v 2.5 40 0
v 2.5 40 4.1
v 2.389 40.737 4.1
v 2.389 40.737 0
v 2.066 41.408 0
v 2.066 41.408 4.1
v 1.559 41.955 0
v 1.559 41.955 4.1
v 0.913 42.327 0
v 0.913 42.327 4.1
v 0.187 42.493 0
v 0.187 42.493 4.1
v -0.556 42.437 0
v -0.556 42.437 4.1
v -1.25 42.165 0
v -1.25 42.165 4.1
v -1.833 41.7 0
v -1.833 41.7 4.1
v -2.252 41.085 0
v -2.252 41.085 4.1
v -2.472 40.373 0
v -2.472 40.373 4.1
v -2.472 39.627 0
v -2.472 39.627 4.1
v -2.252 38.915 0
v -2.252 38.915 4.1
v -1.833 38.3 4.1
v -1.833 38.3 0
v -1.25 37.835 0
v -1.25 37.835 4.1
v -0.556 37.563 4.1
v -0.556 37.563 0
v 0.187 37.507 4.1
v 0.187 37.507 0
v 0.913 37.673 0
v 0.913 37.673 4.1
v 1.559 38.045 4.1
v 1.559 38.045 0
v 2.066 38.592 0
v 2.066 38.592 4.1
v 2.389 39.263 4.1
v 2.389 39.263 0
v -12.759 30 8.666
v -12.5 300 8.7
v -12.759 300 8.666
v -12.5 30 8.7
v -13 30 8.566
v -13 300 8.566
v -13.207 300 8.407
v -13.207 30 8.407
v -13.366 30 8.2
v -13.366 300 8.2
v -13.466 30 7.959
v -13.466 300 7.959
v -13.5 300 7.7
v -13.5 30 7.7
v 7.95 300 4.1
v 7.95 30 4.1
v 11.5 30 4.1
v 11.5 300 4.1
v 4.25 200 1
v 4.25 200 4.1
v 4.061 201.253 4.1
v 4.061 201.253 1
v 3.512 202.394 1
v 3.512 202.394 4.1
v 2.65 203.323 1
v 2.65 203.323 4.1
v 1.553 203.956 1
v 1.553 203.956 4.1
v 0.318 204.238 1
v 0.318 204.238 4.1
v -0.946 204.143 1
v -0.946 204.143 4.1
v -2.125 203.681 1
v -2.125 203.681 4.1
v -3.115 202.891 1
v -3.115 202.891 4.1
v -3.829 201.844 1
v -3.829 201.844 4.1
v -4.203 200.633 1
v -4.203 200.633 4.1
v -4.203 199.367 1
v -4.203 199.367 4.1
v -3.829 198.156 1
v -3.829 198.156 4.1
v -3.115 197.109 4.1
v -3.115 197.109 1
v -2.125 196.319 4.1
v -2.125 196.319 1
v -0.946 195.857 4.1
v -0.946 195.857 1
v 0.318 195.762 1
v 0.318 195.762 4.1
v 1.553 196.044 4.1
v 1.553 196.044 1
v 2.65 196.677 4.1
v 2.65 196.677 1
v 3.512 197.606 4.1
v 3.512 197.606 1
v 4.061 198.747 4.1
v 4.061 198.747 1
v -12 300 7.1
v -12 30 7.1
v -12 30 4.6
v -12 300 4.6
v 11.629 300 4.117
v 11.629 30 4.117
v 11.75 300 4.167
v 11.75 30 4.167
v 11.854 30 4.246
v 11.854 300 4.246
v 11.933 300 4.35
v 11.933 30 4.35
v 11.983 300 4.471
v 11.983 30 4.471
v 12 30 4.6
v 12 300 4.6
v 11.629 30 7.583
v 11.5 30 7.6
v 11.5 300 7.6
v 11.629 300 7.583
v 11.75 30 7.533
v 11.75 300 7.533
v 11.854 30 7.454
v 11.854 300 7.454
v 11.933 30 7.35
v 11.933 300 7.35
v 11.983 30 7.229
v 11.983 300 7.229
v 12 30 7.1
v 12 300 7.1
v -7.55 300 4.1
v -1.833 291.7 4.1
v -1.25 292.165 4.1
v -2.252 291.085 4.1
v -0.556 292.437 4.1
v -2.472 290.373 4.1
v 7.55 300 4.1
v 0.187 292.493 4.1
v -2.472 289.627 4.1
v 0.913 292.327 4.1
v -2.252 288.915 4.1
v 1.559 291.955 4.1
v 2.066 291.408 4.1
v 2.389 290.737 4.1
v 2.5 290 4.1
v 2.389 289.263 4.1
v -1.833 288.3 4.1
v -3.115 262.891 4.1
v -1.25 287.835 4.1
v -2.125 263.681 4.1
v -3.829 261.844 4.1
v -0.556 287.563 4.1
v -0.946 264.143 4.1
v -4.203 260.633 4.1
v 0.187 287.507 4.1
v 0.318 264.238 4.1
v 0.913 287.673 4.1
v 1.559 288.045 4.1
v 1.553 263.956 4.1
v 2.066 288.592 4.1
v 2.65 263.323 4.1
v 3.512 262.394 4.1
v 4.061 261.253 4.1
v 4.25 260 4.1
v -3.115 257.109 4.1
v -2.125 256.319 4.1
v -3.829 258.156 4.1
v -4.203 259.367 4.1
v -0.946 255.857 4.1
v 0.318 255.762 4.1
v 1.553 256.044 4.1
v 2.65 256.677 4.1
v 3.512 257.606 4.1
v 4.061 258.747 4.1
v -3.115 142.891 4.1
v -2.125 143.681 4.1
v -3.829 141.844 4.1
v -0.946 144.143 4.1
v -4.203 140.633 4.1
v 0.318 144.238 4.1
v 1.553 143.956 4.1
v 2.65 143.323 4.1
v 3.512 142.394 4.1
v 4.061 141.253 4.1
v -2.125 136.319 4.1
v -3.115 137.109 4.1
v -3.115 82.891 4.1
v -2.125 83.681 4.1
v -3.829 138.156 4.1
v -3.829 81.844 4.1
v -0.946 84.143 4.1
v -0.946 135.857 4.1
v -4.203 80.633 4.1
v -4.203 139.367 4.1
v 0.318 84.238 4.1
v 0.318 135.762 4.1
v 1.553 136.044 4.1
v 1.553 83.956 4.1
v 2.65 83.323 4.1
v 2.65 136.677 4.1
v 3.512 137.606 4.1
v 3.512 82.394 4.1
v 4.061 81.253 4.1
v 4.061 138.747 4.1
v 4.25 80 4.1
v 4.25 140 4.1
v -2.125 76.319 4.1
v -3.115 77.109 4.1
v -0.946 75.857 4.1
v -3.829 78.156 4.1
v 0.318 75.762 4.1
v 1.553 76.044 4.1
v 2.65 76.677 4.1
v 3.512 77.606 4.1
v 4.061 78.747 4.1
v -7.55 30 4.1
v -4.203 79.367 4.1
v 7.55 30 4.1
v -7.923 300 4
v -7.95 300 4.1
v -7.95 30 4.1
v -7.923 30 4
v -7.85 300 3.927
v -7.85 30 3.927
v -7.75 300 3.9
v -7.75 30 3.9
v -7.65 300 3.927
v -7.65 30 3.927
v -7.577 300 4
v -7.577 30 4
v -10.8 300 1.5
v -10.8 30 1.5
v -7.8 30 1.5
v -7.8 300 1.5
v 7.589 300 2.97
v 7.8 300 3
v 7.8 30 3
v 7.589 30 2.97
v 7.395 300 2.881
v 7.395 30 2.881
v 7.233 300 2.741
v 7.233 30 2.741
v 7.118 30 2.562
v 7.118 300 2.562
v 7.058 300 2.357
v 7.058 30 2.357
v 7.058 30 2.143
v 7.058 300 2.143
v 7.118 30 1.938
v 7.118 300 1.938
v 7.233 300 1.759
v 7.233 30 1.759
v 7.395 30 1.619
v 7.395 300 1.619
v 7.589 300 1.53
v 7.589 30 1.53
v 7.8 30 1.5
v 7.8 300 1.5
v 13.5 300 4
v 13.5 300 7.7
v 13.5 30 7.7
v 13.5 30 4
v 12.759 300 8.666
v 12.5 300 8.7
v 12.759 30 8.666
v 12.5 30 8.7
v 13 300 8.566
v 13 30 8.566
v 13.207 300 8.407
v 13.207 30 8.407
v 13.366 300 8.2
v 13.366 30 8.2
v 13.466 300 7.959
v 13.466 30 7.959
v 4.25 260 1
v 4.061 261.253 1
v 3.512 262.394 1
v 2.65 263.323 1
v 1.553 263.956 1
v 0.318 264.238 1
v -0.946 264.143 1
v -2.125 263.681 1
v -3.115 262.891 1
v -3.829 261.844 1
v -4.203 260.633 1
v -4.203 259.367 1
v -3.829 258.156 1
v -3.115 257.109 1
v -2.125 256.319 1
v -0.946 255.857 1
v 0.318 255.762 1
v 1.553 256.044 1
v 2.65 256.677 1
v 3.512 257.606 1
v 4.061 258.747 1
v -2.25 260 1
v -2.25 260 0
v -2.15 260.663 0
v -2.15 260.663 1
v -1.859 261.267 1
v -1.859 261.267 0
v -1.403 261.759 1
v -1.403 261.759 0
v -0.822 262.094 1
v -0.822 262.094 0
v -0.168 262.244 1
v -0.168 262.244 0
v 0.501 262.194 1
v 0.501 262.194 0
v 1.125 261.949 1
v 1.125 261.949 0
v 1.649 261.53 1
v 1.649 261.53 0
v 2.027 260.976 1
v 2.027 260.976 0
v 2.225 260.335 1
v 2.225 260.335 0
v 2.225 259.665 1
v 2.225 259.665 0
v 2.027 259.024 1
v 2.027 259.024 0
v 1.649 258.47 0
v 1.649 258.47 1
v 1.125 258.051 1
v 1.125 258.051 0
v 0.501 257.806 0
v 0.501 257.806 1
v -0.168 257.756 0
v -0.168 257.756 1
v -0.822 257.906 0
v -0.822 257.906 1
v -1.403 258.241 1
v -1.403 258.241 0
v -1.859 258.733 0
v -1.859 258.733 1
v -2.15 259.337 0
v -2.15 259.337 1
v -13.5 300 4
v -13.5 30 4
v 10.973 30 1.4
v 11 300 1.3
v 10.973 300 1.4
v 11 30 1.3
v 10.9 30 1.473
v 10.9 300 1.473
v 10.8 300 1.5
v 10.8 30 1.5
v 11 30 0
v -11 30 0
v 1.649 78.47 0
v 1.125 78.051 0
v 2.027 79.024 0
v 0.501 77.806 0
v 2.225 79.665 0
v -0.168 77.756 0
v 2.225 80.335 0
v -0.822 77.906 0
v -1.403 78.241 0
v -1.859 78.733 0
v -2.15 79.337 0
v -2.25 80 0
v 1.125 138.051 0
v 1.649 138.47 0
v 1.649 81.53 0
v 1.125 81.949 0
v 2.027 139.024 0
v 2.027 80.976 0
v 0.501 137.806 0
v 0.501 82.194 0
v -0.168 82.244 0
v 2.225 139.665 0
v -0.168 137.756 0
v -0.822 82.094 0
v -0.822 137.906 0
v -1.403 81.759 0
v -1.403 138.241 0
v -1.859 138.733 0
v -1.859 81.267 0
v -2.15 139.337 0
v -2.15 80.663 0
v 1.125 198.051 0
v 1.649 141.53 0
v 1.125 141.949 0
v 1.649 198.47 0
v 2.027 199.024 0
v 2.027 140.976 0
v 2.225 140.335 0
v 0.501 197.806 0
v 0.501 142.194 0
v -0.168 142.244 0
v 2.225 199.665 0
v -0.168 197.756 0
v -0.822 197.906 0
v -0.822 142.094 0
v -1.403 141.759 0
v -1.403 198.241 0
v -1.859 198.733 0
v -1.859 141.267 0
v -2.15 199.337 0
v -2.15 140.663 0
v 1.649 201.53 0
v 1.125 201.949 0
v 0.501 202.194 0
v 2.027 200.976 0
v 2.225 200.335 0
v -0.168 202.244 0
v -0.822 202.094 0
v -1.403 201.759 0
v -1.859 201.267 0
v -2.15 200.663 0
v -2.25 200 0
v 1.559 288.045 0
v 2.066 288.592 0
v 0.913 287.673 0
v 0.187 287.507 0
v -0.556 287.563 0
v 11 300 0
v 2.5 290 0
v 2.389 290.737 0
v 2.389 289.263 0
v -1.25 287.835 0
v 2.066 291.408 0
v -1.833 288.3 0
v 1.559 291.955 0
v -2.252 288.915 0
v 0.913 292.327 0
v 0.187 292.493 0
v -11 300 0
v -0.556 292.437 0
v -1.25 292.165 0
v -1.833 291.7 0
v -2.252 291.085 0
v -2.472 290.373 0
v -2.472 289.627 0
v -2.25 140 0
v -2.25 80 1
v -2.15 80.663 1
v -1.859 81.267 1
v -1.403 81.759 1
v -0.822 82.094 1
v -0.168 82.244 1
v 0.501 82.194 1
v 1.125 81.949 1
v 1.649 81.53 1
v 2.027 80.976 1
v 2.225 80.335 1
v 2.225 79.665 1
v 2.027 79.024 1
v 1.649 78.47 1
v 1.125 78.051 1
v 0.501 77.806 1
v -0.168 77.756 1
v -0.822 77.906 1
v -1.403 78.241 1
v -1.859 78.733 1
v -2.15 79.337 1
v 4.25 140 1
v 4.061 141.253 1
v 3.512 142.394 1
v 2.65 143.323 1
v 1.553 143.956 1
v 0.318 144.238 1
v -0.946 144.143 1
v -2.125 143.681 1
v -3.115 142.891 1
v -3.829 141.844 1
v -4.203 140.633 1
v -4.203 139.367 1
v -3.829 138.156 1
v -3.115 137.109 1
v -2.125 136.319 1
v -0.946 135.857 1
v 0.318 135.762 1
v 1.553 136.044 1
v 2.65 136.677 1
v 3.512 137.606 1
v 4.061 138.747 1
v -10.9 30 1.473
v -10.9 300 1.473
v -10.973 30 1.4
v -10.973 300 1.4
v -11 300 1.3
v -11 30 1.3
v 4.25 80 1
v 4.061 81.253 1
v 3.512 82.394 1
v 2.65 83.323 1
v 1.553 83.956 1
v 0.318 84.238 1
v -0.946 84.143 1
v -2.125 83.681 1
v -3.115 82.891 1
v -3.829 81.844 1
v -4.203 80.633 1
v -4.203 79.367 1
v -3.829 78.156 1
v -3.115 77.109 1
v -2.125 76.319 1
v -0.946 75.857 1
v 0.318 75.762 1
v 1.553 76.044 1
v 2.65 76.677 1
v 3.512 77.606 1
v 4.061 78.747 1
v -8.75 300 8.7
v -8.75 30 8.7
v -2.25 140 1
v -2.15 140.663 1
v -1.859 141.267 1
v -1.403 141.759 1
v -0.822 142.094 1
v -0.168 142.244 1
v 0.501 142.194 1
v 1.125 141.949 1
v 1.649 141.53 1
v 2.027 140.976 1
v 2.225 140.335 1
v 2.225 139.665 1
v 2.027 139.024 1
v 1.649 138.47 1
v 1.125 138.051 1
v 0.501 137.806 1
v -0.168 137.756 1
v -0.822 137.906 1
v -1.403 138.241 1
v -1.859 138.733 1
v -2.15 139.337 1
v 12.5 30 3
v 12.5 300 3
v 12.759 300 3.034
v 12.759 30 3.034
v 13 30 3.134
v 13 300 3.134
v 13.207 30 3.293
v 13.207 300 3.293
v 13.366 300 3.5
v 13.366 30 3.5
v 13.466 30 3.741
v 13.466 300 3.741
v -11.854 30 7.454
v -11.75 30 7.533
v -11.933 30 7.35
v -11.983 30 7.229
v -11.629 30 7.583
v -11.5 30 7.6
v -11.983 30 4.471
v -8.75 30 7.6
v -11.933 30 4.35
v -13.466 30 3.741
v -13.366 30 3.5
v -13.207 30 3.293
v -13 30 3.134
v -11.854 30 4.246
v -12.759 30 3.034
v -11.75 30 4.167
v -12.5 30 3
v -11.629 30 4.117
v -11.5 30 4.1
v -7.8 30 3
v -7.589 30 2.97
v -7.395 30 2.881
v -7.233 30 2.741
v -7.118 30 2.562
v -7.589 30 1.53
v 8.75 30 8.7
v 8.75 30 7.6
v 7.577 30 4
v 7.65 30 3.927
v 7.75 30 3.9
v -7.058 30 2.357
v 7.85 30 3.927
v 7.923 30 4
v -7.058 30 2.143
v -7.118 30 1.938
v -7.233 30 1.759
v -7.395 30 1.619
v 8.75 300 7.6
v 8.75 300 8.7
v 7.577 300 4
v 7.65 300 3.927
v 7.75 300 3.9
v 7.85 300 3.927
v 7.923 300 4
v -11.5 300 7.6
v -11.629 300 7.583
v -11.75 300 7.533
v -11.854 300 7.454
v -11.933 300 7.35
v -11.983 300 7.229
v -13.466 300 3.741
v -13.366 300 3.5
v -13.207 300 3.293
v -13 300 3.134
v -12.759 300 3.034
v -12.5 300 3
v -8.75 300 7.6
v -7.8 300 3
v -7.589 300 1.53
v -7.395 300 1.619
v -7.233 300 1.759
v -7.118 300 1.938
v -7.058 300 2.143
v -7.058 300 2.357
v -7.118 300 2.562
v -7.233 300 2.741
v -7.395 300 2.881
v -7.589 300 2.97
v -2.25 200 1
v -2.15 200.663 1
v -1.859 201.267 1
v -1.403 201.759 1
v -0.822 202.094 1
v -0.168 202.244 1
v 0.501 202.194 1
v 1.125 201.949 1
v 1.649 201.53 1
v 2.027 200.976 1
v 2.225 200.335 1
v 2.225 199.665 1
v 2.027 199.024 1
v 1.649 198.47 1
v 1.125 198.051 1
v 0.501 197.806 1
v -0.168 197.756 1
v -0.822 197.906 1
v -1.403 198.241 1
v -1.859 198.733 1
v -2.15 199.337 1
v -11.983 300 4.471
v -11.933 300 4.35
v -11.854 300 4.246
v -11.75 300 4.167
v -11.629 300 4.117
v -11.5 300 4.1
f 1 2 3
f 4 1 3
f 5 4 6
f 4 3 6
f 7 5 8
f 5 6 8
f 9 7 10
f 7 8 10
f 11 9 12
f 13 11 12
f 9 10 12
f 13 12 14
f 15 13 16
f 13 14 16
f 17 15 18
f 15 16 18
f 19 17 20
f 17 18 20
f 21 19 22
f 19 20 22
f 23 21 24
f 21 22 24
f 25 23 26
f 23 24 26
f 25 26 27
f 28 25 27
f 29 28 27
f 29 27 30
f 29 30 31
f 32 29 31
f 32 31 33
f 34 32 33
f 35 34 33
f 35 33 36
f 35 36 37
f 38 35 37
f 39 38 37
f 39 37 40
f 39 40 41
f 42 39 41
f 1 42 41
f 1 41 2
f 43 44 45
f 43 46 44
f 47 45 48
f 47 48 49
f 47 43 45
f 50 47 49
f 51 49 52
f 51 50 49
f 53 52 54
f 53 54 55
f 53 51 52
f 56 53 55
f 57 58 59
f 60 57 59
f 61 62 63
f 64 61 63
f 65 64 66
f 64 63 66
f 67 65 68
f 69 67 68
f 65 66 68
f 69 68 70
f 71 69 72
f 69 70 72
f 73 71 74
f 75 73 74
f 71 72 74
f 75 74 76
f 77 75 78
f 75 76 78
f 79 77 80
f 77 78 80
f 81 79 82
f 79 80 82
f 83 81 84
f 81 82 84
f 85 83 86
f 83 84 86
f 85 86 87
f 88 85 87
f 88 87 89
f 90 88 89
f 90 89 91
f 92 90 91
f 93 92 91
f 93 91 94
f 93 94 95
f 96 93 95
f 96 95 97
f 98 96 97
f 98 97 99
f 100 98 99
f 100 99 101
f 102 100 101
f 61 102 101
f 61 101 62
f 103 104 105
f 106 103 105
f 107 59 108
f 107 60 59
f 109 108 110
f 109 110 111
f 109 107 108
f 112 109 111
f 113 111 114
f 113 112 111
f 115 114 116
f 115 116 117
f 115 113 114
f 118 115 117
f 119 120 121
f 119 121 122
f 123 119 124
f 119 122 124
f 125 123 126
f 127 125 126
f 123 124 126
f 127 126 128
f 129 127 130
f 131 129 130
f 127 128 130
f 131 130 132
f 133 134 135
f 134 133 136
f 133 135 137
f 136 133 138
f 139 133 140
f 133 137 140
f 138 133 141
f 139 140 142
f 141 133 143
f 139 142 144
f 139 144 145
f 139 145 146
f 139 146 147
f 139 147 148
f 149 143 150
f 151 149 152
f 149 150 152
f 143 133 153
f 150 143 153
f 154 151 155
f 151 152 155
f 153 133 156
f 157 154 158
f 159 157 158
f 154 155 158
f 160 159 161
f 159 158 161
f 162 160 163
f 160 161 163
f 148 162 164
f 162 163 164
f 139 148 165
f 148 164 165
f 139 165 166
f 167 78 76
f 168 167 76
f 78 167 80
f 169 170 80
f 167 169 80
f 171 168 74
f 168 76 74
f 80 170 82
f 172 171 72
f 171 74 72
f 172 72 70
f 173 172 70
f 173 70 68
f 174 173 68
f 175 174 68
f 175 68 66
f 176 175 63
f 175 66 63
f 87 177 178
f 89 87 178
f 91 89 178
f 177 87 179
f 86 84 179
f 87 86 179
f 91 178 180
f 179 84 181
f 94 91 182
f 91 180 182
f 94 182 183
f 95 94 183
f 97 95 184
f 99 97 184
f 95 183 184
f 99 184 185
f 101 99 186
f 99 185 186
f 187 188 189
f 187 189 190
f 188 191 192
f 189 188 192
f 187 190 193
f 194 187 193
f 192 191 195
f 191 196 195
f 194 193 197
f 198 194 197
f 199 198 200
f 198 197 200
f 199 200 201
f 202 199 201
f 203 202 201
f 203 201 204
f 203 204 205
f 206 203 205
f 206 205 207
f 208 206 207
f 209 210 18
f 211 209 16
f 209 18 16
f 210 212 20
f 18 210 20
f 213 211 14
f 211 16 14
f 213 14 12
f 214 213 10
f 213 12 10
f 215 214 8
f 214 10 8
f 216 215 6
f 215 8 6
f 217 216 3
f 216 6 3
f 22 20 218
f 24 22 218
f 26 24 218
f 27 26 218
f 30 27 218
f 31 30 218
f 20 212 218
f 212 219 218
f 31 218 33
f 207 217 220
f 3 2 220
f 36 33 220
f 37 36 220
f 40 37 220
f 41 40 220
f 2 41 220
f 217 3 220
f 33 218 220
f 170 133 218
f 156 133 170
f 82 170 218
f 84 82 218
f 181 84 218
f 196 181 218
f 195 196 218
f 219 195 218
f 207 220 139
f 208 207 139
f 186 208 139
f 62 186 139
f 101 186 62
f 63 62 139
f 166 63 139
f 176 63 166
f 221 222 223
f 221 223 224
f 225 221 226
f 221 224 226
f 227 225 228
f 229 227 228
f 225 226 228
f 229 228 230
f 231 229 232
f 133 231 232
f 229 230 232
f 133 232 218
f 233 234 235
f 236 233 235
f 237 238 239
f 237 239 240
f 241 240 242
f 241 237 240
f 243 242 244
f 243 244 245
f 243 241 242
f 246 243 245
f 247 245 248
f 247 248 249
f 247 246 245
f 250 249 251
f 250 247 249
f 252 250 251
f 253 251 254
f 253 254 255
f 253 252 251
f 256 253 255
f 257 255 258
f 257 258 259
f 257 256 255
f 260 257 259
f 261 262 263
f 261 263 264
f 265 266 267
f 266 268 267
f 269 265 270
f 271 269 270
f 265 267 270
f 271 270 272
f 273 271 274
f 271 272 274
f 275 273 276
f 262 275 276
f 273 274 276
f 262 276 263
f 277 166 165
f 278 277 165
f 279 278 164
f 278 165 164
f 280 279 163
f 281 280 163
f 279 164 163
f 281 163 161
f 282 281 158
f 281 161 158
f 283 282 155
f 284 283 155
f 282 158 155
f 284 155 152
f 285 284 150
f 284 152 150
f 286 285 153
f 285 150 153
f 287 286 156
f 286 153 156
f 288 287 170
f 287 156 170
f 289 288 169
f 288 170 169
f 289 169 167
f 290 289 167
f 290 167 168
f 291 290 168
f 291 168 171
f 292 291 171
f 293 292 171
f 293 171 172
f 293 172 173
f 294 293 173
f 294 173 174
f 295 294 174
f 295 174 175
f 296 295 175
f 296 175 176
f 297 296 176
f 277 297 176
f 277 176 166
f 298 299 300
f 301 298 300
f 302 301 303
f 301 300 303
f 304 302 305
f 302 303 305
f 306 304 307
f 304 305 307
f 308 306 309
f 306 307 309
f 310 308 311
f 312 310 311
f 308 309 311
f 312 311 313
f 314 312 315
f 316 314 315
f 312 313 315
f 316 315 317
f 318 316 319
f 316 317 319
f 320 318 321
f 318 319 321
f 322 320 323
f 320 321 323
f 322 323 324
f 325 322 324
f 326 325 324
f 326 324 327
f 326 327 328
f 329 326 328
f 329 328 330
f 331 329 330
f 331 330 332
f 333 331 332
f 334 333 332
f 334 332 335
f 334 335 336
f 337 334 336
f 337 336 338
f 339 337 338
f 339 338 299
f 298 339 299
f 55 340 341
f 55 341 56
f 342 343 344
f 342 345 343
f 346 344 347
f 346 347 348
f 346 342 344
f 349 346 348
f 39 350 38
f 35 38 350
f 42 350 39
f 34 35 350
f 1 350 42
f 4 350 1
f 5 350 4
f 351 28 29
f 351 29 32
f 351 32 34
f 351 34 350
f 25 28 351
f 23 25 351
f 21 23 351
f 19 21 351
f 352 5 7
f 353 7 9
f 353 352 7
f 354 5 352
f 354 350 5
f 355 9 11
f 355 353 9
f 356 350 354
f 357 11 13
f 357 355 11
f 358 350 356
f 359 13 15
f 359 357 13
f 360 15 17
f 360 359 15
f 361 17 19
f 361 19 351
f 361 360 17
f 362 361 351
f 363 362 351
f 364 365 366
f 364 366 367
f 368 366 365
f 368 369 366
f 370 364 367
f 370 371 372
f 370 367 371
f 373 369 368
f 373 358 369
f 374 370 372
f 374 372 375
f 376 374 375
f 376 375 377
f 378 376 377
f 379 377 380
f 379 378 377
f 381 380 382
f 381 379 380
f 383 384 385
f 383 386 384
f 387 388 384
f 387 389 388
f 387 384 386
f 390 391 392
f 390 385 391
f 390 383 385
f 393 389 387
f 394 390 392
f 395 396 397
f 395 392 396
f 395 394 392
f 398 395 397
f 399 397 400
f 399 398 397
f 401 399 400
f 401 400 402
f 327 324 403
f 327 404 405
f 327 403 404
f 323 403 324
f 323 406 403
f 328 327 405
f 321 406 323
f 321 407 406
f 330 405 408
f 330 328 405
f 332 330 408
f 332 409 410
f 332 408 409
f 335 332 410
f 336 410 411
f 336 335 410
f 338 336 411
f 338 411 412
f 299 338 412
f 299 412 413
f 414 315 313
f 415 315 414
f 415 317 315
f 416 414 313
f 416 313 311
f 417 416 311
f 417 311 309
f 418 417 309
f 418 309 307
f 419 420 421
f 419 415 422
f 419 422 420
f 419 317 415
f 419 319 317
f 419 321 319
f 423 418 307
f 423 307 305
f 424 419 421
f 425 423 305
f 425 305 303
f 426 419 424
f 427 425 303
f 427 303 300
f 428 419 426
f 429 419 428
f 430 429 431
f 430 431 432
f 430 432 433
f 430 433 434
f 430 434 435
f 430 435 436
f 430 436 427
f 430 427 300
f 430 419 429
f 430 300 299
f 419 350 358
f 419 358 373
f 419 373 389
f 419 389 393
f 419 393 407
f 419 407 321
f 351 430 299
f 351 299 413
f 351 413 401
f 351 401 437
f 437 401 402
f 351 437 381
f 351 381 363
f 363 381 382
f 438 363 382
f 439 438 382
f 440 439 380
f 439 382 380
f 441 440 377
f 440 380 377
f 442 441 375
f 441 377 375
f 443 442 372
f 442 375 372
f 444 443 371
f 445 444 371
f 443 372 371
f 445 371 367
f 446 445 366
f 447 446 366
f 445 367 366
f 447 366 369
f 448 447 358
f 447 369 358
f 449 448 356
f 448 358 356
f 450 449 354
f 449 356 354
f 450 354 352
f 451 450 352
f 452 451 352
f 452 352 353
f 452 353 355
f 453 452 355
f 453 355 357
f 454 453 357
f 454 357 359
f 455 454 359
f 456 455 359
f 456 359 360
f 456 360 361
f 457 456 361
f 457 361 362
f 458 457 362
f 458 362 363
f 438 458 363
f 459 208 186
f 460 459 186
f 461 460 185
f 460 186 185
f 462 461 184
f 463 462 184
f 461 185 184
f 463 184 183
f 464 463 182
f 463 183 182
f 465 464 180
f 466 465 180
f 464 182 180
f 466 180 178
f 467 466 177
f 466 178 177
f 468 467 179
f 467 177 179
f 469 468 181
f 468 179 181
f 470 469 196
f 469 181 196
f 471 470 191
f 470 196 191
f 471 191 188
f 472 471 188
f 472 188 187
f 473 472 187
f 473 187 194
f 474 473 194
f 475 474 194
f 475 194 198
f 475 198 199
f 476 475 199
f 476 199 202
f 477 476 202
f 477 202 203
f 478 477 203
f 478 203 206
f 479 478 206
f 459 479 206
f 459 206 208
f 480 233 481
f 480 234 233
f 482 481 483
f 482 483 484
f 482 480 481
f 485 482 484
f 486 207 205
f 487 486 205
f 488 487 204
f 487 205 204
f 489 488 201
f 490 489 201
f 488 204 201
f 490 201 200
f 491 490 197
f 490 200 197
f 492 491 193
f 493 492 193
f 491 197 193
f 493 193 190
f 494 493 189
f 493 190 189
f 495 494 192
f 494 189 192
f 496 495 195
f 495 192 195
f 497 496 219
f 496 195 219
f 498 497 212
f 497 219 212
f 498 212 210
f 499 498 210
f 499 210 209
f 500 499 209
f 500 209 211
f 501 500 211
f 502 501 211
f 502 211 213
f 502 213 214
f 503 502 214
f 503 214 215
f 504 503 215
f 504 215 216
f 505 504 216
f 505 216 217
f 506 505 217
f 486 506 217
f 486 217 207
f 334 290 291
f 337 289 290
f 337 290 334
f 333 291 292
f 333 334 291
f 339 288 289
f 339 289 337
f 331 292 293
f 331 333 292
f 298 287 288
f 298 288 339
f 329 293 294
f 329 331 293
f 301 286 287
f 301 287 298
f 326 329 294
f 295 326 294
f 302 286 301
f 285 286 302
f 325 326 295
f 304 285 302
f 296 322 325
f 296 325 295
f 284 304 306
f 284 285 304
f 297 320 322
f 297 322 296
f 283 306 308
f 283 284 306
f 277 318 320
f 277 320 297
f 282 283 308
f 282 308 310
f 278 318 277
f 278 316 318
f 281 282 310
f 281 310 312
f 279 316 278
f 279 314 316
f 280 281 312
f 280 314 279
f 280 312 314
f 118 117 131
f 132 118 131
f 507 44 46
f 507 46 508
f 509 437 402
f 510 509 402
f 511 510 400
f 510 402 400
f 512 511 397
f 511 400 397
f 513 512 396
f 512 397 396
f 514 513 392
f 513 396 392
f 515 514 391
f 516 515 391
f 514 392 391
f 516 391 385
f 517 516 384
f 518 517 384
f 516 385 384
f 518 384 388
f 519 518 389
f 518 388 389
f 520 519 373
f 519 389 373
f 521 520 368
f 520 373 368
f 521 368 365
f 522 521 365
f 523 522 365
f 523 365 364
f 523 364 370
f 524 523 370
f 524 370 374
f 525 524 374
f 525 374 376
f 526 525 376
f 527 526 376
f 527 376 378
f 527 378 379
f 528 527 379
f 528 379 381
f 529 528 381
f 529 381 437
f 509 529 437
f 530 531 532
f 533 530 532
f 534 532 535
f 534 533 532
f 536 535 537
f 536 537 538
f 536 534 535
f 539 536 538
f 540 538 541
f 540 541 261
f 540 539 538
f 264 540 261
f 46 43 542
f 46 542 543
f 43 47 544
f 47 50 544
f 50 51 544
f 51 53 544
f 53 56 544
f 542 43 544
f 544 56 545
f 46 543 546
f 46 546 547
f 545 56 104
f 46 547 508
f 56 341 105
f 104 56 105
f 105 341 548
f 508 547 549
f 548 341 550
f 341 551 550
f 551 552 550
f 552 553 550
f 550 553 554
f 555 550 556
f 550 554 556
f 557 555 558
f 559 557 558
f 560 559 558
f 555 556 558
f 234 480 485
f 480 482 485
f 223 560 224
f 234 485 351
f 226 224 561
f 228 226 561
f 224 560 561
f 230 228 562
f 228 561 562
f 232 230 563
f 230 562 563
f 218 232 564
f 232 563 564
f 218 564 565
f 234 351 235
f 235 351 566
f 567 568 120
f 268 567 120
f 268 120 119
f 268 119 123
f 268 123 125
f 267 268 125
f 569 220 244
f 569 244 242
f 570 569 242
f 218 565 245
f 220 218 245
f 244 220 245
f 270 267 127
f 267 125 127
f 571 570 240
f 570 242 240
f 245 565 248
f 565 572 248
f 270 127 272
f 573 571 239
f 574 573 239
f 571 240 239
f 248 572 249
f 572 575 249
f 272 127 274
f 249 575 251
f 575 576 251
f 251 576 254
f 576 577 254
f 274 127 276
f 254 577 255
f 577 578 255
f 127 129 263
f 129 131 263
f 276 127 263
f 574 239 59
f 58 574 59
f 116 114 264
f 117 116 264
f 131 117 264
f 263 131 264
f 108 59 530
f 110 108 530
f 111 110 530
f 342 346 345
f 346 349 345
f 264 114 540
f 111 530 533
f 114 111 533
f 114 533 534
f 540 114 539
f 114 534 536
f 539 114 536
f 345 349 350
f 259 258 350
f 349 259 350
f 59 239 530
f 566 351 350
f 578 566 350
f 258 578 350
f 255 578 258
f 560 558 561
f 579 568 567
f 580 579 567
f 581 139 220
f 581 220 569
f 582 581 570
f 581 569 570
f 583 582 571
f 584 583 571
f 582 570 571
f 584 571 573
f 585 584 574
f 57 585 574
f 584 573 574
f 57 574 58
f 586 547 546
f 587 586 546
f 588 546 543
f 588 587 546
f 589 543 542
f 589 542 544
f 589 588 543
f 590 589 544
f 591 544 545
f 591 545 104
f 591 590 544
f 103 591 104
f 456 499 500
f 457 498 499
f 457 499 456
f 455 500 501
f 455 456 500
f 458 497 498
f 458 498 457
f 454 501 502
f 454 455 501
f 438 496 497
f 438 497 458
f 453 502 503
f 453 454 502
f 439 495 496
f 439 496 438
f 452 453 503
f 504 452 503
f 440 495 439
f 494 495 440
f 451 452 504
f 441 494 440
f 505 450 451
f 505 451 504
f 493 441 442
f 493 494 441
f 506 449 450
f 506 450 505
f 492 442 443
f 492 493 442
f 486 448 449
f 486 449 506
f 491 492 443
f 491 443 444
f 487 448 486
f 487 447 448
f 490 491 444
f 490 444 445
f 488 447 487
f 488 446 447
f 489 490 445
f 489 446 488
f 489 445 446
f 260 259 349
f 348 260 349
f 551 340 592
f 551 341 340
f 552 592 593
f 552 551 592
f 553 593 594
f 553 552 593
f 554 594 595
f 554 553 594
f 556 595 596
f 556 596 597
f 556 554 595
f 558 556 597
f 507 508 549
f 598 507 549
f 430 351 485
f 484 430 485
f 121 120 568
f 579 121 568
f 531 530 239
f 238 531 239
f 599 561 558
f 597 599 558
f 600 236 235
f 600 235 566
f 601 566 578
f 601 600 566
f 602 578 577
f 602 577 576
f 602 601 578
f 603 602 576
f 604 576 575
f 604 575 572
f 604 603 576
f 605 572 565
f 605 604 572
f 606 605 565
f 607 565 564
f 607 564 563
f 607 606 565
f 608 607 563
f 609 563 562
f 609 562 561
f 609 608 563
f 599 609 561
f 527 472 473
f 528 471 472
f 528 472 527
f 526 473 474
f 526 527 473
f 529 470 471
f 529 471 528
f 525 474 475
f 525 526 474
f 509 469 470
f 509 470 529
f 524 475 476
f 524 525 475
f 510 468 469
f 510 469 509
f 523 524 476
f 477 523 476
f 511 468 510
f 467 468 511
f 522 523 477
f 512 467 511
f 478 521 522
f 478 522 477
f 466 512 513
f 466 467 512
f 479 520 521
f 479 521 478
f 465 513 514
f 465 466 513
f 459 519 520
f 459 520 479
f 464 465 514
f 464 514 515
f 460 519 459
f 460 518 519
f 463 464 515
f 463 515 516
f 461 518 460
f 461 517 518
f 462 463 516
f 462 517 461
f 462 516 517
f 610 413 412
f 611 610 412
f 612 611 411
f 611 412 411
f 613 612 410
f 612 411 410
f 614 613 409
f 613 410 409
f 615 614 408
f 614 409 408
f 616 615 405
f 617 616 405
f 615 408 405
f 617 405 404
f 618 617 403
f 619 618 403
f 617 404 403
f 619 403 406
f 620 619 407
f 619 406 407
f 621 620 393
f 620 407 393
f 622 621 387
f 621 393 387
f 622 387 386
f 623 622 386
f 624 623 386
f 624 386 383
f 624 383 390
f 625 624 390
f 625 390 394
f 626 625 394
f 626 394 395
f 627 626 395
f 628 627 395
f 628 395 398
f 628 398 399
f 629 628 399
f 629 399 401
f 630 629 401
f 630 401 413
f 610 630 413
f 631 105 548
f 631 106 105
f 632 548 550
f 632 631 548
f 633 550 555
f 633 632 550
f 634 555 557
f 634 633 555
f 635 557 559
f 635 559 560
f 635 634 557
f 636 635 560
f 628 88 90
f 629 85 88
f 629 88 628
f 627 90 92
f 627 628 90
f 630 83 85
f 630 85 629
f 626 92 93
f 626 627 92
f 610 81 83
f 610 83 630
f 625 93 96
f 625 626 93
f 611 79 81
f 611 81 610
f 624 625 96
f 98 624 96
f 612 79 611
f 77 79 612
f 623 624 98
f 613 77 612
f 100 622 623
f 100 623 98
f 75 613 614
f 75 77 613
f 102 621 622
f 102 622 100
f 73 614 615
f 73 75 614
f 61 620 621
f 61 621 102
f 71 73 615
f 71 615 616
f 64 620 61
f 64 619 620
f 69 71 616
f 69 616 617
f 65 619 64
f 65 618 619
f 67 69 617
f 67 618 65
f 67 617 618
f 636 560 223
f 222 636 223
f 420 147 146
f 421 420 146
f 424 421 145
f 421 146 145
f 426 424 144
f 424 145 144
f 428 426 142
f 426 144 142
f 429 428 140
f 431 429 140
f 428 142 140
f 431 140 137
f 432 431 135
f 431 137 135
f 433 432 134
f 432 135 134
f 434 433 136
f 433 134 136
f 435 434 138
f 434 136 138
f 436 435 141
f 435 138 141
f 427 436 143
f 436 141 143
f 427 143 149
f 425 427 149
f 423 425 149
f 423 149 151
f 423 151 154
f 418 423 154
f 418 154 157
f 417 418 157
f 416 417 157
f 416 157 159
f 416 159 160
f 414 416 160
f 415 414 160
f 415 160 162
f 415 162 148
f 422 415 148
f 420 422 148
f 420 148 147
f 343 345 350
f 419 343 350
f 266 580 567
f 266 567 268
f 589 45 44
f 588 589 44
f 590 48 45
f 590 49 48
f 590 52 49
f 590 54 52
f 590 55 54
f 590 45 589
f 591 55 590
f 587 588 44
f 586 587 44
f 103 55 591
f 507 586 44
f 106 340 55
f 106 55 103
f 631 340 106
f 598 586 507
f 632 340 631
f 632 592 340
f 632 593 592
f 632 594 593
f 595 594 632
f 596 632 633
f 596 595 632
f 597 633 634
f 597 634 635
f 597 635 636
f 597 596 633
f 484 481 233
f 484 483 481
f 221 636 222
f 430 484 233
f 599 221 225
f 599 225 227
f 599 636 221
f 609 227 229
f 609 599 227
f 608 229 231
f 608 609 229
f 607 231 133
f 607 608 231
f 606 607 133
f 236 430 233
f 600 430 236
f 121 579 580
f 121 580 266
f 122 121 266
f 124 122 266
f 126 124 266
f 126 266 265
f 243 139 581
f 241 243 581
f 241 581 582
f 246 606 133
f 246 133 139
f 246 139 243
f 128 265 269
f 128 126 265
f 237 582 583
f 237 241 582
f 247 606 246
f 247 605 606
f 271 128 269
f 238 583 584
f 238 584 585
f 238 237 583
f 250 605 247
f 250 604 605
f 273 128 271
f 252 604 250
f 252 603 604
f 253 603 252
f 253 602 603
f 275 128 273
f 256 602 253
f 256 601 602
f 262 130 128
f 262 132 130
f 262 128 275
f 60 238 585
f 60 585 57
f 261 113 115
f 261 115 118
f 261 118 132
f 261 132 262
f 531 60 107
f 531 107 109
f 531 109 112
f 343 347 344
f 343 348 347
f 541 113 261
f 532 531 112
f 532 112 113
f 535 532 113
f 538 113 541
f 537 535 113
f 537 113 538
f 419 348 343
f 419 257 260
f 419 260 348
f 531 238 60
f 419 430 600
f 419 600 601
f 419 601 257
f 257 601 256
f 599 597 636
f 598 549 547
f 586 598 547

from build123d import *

# Parameters (mm, degrees)
BOSS_EXTRUDE1_DEPTH                              = 270
CUT_EXTRUDE1_DEPTH                               = 271.477244884
F_0_4_0_4_DIAMETER_HOLE1_D                       = 0.4
CBORE_FOR_M4_HEX_HEAD_MACHINE_SCREW1_D           = 4.5
CBORE_FOR_M4_HEX_HEAD_MACHINE_SCREW1_DEPTH       = 4.1
CBORE_FOR_M4_HEX_HEAD_MACHINE_SCREW1_CBORE_D     = 8.5
CBORE_FOR_M4_HEX_HEAD_MACHINE_SCREW1_CBORE_DEPTH = 3.1
FILLET1_R                                        = 0.2
FILLET2_R                                        = 0.5
FILLET3_R                                        = 1
CUT_EXTRUDE2_REACH                               = 302.339
SKETCH7_R                                        = 2.5


with BuildPart() as part:
    # Sketch1 → Boss-Extrude1 (new body)
    with BuildSketch(Plane(origin=(0, 300, 0), x_dir=(1, 0, 0), z_dir=(0, 1, 0))):
        with BuildLine():
            Line((-13.5, -3), (-13.5, -8.7))
            Line((-13.5, -8.7), (13.5, -8.7))
            Line((13.5, -8.7), (13.5, -3))
            Line((13.5, -3), (7.8, -3))
            ThreePointArc((7.8, -3), (7.05, -2.25), (7.8, -1.5))
            Line((7.8, -1.5), (11, -1.5))
            Line((11, -1.5), (11, 0))
            Line((11, 0), (-11, 0))
            Line((-11, 0), (-11, -1.5))
            Line((-11, -1.5), (-7.8, -1.5))
            ThreePointArc((-7.8, -1.5), (-7.05, -2.25), (-7.8, -3))
            Line((-7.8, -3), (-13.5, -3))
        make_face()
    extrude(amount=-BOSS_EXTRUDE1_DEPTH)

    # Sketch2 → Cut-Extrude1 (cut, through all)
    with BuildSketch(Plane.XZ.offset(-30)):
        Polygon((8.75, 8.7), (-8.75, 8.7), (-8.75, 7.6), (-12, 7.6), (-12, 4.1), (12, 4.1), (12, 7.6), (8.75, 7.6), align=None)
    extrude(amount=-CUT_EXTRUDE1_DEPTH, mode=Mode.SUBTRACT)

    # Ø0.4 (0.4) Diameter Hole1 (through all)
    with Locations(Plane(origin=(0, 300, 0), x_dir=(1, 0, 0), z_dir=(0, 1, 0))):
        with Locations((-7.75, -4.1), (7.75, -4.1)):
            Hole(F_0_4_0_4_DIAMETER_HOLE1_D / 2)

    # CBORE for M4 Hex Head Machine Screw1
    with Locations(Plane.XY.offset(4.1)):
        with Locations((0, 260), (0, 200), (0, 140), (0, 80), (0, 20)):
            CounterBoreHole(CBORE_FOR_M4_HEX_HEAD_MACHINE_SCREW1_D / 2, CBORE_FOR_M4_HEX_HEAD_MACHINE_SCREW1_CBORE_D / 2, CBORE_FOR_M4_HEX_HEAD_MACHINE_SCREW1_CBORE_DEPTH, depth=CBORE_FOR_M4_HEX_HEAD_MACHINE_SCREW1_DEPTH)

    # Fillet1
    fillet1_edges = [part.edges().sort_by_distance(p)[0] for p in [
        (-11, 165, 1.5),
        (11, 165, 1.5),
    ]]
    fillet(fillet1_edges, radius=FILLET1_R)

    # Fillet2
    fillet2_edges = [part.edges().sort_by_distance(p)[0] for p in [
        (12, 165, 7.6),
        (12, 165, 4.1),
        (-12, 165, 4.1),
        (-12, 165, 7.6),
    ]]
    fillet(fillet2_edges, radius=FILLET2_R)

    # Fillet3
    fillet3_edges = [part.edges().sort_by_distance(p)[0] for p in [
        (13.5, 165, 3),
        (13.5, 165, 8.7),
        (-13.5, 165, 8.7),
        (-13.5, 165, 3),
    ]]
    fillet(fillet3_edges, radius=FILLET3_R)

    # Sketch7 → Cut-Extrude2 (cut, up to next)
    with BuildSketch(Plane.XY.offset(4.1), mode=Mode.PRIVATE) as cut_extrude2_sk1:
        with Locations((0, 290)):
            Circle(SKETCH7_R)
    cut_extrude2_tool1 = extrude(cut_extrude2_sk1.sketch, amount=-CUT_EXTRUDE2_REACH, mode=Mode.PRIVATE) & part.part
    # Sketch7 → Cut-Extrude2 (cut, up to next)
    with BuildSketch(Plane.XY.offset(4.1), mode=Mode.PRIVATE) as cut_extrude2_sk2:
        with Locations((0, 40)):
            Circle(SKETCH7_R)
    cut_extrude2_tool2 = extrude(cut_extrude2_sk2.sketch, amount=-CUT_EXTRUDE2_REACH, mode=Mode.PRIVATE) & part.part
    add(cut_extrude2_tool1.solids().sort_by_distance((0, 290, 4.1))[0], mode=Mode.SUBTRACT)
    add(cut_extrude2_tool2.solids().sort_by_distance((0, 40, 4.1))[0], mode=Mode.SUBTRACT)


solid = part.part
